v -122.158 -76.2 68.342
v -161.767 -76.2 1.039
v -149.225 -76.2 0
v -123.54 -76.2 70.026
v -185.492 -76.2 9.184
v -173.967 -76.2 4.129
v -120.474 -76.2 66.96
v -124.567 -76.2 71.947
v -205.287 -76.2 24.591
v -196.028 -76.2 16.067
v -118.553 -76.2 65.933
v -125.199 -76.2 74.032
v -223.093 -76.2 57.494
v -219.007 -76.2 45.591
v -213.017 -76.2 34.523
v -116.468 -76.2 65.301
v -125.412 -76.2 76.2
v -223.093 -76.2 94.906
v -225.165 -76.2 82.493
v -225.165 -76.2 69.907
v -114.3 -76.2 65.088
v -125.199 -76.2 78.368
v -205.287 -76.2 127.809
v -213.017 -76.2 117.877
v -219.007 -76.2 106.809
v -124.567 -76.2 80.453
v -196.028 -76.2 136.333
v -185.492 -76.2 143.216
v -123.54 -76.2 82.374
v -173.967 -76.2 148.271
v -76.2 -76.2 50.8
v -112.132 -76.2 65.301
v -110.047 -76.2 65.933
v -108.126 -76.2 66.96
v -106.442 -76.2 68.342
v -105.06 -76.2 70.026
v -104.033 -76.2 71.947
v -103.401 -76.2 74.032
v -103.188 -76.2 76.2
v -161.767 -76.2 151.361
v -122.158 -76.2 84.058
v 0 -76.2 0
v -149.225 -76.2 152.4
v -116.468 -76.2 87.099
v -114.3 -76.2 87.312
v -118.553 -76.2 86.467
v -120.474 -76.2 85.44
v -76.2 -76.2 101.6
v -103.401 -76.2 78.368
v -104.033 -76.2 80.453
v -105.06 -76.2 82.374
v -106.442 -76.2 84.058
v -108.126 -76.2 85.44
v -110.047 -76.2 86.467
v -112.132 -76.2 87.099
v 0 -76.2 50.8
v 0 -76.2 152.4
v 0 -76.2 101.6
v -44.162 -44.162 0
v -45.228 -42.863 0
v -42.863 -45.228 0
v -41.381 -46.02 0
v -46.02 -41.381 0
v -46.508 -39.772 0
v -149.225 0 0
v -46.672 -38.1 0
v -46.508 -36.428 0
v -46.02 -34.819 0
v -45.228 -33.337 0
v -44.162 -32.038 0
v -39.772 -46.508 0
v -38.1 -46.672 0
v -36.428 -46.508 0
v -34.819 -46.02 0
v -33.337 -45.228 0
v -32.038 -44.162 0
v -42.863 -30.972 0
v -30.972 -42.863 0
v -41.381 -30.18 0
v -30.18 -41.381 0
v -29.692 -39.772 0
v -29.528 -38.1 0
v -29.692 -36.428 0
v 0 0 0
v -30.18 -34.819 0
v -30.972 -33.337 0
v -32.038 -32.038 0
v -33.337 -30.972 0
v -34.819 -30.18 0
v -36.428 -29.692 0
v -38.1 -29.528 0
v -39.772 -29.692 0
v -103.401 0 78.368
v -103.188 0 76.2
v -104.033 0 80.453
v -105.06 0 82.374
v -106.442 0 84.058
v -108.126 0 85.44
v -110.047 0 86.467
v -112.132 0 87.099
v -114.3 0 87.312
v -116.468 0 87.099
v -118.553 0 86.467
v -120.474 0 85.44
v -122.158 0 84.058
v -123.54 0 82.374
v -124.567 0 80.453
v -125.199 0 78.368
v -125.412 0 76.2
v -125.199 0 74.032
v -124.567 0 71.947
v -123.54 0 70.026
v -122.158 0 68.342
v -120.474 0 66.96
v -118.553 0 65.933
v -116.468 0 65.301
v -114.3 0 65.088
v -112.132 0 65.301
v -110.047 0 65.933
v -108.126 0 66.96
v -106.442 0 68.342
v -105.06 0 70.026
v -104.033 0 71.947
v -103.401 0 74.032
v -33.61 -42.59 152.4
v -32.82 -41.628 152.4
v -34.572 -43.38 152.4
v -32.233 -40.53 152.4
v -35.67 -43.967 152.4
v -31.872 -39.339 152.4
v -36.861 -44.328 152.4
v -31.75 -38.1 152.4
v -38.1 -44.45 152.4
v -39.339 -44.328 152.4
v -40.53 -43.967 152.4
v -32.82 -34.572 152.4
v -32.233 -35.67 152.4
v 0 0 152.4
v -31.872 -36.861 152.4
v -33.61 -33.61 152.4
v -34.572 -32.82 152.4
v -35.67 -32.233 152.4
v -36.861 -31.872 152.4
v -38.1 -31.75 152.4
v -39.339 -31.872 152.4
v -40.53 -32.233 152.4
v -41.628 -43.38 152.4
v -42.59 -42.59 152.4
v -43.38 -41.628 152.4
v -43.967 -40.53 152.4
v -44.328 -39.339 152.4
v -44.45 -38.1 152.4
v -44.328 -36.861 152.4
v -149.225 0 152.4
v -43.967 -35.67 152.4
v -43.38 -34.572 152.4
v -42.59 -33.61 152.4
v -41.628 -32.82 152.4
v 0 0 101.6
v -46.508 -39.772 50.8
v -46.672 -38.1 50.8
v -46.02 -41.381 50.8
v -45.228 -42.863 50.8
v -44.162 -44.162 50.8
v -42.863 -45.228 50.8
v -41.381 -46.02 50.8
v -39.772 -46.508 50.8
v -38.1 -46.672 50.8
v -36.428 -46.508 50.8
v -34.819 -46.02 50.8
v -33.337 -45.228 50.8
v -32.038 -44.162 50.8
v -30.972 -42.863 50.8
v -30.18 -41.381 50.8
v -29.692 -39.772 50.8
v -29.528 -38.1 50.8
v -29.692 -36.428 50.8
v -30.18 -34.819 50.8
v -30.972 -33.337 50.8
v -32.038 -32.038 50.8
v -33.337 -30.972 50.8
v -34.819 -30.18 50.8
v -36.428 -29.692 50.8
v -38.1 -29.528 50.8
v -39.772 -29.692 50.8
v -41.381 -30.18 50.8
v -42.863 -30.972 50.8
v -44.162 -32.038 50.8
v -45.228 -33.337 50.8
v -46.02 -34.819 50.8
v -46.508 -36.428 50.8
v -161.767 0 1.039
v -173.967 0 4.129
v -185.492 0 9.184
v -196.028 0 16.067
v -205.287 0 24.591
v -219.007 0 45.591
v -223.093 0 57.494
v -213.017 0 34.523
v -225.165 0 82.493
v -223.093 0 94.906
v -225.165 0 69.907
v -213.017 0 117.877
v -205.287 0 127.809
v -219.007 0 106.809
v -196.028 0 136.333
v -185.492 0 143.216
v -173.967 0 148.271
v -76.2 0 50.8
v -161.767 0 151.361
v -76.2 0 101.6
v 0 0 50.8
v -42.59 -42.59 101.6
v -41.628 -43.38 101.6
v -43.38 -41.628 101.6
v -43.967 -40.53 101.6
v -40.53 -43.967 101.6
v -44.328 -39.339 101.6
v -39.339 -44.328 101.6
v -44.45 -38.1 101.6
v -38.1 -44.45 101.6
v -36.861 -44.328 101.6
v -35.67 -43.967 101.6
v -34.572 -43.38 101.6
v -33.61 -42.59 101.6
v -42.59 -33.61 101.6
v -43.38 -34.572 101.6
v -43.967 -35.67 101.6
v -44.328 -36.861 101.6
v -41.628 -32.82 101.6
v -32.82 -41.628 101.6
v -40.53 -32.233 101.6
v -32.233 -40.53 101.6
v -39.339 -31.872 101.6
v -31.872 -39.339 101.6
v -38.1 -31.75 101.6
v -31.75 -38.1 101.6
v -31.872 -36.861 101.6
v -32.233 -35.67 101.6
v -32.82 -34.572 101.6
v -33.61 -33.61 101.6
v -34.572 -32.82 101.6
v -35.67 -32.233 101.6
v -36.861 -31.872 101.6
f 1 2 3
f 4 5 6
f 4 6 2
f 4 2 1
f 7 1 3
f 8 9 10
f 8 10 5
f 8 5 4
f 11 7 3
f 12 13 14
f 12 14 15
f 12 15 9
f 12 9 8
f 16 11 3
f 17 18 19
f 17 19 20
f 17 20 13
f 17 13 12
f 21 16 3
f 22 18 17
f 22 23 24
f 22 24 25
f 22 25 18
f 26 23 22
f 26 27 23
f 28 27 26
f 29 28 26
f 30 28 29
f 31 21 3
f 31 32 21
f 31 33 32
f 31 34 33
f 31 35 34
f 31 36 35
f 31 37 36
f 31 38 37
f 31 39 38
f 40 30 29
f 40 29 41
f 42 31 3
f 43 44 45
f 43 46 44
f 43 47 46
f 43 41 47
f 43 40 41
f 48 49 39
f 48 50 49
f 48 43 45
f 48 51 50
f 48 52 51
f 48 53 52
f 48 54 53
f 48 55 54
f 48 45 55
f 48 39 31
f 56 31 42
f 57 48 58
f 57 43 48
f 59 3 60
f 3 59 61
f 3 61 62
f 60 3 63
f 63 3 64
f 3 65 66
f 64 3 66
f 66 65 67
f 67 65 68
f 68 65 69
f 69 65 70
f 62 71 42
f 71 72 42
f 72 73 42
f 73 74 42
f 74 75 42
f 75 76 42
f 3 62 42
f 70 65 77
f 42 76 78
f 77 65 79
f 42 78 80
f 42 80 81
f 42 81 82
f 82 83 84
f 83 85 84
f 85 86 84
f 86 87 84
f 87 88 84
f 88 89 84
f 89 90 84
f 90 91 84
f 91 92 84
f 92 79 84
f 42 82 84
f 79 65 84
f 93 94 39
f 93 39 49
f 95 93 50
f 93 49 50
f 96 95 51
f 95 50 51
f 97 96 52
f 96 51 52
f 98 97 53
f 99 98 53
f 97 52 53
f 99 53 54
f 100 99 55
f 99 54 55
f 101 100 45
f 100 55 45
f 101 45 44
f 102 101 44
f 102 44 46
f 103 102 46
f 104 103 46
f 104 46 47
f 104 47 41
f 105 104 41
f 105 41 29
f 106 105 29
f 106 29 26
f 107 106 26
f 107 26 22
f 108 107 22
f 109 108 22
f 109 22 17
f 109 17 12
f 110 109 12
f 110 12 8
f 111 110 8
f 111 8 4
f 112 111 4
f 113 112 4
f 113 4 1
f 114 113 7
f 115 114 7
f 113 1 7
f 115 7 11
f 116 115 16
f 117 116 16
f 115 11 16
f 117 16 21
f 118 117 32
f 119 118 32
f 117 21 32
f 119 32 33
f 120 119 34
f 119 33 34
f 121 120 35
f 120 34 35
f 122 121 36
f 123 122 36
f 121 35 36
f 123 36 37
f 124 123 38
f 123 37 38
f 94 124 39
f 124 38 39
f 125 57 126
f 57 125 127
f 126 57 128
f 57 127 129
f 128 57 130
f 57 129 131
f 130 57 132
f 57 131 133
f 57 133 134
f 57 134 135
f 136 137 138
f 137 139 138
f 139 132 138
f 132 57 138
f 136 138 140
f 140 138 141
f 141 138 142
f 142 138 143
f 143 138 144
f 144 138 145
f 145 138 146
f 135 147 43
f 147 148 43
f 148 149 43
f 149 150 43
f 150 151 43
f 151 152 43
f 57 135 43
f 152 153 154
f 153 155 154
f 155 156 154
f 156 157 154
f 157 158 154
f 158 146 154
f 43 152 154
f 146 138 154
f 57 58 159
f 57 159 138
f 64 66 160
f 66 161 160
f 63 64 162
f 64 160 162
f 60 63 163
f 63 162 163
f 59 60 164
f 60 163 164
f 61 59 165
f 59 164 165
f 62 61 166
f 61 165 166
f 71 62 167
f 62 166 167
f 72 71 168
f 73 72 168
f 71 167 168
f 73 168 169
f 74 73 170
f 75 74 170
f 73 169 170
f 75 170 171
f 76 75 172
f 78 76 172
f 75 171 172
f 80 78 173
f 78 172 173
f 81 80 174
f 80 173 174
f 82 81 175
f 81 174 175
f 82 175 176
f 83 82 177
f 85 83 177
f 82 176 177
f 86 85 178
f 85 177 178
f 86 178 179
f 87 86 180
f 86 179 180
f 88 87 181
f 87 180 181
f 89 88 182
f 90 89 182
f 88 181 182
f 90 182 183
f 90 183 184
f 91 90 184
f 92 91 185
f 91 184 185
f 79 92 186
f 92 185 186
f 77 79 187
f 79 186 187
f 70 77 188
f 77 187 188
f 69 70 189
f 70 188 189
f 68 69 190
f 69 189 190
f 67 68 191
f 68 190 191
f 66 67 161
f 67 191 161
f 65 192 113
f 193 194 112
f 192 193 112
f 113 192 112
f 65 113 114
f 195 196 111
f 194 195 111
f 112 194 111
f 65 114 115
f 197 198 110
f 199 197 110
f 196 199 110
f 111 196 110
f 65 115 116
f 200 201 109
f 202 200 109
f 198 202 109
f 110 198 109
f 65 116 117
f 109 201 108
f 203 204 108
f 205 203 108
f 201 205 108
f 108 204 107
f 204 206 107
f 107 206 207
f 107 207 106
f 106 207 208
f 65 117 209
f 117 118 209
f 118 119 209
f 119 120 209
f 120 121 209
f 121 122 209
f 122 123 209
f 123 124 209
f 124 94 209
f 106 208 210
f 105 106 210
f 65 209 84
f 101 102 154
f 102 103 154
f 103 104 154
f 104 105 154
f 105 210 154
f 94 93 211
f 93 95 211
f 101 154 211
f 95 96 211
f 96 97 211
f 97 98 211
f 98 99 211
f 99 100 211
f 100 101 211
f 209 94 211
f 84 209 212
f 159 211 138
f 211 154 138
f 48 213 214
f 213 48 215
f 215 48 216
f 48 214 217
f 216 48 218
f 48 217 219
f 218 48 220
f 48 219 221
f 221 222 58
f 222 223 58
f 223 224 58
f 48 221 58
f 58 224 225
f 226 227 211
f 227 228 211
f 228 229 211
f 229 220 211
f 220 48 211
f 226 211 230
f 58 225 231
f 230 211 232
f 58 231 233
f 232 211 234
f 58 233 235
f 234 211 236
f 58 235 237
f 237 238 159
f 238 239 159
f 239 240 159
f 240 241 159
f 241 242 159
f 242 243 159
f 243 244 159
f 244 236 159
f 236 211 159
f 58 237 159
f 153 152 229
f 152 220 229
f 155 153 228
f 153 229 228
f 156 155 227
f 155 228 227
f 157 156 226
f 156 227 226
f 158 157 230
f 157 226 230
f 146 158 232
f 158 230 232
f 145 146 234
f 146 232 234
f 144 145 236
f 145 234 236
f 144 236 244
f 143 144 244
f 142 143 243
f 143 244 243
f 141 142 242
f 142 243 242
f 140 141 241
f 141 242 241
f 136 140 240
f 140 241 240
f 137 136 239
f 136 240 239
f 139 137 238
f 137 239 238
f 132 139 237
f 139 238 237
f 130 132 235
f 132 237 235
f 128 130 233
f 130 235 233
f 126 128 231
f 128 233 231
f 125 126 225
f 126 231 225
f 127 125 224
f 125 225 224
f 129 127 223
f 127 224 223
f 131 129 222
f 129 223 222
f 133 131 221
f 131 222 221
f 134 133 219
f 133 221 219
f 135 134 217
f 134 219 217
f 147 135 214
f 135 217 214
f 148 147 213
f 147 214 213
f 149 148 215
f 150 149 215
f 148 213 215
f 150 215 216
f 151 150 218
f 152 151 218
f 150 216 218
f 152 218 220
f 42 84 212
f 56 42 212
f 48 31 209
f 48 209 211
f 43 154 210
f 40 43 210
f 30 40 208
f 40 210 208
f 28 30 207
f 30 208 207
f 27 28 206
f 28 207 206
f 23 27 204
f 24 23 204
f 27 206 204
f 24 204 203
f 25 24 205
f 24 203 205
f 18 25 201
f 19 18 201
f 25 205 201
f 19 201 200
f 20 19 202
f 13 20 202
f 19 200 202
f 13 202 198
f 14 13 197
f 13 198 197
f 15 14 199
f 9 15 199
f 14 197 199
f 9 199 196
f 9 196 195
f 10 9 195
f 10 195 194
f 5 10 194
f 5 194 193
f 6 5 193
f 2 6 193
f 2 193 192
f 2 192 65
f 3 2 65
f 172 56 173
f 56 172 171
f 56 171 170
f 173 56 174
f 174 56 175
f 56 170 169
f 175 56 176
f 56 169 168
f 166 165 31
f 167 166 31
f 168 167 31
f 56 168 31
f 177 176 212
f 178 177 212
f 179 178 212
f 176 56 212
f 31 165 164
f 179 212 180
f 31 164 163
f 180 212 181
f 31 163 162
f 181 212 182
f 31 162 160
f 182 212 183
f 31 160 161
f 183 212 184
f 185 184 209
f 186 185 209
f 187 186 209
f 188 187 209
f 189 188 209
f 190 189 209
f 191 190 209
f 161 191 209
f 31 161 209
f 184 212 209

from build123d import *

# Parameters (mm, degrees)
F1_DEPTH = 76.2
F3_D     = 17.145
F3_DEPTH = 50.8
F3_TIP   = 5.1508776566
F5_D     = 12.7
F5_DEPTH = 50.8
F5_TIP   = 3.8154649308
F7_D     = 22.225


with BuildPart() as f1:
    # F0 (on Front) → F1 (new body)
    with BuildSketch(Plane.XZ):
        Polygon((-149.225, 0), (0, 0), (0, 50.8), (-76.2, 50.8), (-76.2, 101.6), (0, 101.6), (0, 152.4), (-149.225, 152.4), align=None)
        with BuildLine():
            ThreePointArc((-149.225, 152.4), (-225.425, 76.2), (-149.225, 0))
            Line((-149.225, 0), (-149.225, 152.4))
        make_face()
    extrude(amount=F1_DEPTH)

    # F3
    with Locations(Plane(origin=(0, 0, 0), x_dir=(1, 0, 0), z_dir=(0, 0, -1))):
        with Locations((-38.1, 38.1)):
            Hole(F3_D / 2, depth=F3_DEPTH)
            with Locations((0, 0, -(F3_DEPTH + F3_TIP / 2))):  # 118° drill point
                Cone(0, F3_D / 2, F3_TIP, mode=Mode.SUBTRACT)

    # F5
    with Locations(Plane.XY.offset(152.4)):
        with Locations((-38.1, -38.1)):
            Hole(F5_D / 2, depth=F5_DEPTH)
            with Locations((0, 0, -(F5_DEPTH + F5_TIP / 2))):  # 118° drill point
                Cone(0, F5_D / 2, F5_TIP, mode=Mode.SUBTRACT)

    # F7 (through all)
    with Locations(Plane(origin=(0, 0, 0), x_dir=(-1, 0, 0), z_dir=(0, 1, 0))):
        with Locations((114.3, 76.2)):
            Hole(F7_D / 2)


solid = f1.part
